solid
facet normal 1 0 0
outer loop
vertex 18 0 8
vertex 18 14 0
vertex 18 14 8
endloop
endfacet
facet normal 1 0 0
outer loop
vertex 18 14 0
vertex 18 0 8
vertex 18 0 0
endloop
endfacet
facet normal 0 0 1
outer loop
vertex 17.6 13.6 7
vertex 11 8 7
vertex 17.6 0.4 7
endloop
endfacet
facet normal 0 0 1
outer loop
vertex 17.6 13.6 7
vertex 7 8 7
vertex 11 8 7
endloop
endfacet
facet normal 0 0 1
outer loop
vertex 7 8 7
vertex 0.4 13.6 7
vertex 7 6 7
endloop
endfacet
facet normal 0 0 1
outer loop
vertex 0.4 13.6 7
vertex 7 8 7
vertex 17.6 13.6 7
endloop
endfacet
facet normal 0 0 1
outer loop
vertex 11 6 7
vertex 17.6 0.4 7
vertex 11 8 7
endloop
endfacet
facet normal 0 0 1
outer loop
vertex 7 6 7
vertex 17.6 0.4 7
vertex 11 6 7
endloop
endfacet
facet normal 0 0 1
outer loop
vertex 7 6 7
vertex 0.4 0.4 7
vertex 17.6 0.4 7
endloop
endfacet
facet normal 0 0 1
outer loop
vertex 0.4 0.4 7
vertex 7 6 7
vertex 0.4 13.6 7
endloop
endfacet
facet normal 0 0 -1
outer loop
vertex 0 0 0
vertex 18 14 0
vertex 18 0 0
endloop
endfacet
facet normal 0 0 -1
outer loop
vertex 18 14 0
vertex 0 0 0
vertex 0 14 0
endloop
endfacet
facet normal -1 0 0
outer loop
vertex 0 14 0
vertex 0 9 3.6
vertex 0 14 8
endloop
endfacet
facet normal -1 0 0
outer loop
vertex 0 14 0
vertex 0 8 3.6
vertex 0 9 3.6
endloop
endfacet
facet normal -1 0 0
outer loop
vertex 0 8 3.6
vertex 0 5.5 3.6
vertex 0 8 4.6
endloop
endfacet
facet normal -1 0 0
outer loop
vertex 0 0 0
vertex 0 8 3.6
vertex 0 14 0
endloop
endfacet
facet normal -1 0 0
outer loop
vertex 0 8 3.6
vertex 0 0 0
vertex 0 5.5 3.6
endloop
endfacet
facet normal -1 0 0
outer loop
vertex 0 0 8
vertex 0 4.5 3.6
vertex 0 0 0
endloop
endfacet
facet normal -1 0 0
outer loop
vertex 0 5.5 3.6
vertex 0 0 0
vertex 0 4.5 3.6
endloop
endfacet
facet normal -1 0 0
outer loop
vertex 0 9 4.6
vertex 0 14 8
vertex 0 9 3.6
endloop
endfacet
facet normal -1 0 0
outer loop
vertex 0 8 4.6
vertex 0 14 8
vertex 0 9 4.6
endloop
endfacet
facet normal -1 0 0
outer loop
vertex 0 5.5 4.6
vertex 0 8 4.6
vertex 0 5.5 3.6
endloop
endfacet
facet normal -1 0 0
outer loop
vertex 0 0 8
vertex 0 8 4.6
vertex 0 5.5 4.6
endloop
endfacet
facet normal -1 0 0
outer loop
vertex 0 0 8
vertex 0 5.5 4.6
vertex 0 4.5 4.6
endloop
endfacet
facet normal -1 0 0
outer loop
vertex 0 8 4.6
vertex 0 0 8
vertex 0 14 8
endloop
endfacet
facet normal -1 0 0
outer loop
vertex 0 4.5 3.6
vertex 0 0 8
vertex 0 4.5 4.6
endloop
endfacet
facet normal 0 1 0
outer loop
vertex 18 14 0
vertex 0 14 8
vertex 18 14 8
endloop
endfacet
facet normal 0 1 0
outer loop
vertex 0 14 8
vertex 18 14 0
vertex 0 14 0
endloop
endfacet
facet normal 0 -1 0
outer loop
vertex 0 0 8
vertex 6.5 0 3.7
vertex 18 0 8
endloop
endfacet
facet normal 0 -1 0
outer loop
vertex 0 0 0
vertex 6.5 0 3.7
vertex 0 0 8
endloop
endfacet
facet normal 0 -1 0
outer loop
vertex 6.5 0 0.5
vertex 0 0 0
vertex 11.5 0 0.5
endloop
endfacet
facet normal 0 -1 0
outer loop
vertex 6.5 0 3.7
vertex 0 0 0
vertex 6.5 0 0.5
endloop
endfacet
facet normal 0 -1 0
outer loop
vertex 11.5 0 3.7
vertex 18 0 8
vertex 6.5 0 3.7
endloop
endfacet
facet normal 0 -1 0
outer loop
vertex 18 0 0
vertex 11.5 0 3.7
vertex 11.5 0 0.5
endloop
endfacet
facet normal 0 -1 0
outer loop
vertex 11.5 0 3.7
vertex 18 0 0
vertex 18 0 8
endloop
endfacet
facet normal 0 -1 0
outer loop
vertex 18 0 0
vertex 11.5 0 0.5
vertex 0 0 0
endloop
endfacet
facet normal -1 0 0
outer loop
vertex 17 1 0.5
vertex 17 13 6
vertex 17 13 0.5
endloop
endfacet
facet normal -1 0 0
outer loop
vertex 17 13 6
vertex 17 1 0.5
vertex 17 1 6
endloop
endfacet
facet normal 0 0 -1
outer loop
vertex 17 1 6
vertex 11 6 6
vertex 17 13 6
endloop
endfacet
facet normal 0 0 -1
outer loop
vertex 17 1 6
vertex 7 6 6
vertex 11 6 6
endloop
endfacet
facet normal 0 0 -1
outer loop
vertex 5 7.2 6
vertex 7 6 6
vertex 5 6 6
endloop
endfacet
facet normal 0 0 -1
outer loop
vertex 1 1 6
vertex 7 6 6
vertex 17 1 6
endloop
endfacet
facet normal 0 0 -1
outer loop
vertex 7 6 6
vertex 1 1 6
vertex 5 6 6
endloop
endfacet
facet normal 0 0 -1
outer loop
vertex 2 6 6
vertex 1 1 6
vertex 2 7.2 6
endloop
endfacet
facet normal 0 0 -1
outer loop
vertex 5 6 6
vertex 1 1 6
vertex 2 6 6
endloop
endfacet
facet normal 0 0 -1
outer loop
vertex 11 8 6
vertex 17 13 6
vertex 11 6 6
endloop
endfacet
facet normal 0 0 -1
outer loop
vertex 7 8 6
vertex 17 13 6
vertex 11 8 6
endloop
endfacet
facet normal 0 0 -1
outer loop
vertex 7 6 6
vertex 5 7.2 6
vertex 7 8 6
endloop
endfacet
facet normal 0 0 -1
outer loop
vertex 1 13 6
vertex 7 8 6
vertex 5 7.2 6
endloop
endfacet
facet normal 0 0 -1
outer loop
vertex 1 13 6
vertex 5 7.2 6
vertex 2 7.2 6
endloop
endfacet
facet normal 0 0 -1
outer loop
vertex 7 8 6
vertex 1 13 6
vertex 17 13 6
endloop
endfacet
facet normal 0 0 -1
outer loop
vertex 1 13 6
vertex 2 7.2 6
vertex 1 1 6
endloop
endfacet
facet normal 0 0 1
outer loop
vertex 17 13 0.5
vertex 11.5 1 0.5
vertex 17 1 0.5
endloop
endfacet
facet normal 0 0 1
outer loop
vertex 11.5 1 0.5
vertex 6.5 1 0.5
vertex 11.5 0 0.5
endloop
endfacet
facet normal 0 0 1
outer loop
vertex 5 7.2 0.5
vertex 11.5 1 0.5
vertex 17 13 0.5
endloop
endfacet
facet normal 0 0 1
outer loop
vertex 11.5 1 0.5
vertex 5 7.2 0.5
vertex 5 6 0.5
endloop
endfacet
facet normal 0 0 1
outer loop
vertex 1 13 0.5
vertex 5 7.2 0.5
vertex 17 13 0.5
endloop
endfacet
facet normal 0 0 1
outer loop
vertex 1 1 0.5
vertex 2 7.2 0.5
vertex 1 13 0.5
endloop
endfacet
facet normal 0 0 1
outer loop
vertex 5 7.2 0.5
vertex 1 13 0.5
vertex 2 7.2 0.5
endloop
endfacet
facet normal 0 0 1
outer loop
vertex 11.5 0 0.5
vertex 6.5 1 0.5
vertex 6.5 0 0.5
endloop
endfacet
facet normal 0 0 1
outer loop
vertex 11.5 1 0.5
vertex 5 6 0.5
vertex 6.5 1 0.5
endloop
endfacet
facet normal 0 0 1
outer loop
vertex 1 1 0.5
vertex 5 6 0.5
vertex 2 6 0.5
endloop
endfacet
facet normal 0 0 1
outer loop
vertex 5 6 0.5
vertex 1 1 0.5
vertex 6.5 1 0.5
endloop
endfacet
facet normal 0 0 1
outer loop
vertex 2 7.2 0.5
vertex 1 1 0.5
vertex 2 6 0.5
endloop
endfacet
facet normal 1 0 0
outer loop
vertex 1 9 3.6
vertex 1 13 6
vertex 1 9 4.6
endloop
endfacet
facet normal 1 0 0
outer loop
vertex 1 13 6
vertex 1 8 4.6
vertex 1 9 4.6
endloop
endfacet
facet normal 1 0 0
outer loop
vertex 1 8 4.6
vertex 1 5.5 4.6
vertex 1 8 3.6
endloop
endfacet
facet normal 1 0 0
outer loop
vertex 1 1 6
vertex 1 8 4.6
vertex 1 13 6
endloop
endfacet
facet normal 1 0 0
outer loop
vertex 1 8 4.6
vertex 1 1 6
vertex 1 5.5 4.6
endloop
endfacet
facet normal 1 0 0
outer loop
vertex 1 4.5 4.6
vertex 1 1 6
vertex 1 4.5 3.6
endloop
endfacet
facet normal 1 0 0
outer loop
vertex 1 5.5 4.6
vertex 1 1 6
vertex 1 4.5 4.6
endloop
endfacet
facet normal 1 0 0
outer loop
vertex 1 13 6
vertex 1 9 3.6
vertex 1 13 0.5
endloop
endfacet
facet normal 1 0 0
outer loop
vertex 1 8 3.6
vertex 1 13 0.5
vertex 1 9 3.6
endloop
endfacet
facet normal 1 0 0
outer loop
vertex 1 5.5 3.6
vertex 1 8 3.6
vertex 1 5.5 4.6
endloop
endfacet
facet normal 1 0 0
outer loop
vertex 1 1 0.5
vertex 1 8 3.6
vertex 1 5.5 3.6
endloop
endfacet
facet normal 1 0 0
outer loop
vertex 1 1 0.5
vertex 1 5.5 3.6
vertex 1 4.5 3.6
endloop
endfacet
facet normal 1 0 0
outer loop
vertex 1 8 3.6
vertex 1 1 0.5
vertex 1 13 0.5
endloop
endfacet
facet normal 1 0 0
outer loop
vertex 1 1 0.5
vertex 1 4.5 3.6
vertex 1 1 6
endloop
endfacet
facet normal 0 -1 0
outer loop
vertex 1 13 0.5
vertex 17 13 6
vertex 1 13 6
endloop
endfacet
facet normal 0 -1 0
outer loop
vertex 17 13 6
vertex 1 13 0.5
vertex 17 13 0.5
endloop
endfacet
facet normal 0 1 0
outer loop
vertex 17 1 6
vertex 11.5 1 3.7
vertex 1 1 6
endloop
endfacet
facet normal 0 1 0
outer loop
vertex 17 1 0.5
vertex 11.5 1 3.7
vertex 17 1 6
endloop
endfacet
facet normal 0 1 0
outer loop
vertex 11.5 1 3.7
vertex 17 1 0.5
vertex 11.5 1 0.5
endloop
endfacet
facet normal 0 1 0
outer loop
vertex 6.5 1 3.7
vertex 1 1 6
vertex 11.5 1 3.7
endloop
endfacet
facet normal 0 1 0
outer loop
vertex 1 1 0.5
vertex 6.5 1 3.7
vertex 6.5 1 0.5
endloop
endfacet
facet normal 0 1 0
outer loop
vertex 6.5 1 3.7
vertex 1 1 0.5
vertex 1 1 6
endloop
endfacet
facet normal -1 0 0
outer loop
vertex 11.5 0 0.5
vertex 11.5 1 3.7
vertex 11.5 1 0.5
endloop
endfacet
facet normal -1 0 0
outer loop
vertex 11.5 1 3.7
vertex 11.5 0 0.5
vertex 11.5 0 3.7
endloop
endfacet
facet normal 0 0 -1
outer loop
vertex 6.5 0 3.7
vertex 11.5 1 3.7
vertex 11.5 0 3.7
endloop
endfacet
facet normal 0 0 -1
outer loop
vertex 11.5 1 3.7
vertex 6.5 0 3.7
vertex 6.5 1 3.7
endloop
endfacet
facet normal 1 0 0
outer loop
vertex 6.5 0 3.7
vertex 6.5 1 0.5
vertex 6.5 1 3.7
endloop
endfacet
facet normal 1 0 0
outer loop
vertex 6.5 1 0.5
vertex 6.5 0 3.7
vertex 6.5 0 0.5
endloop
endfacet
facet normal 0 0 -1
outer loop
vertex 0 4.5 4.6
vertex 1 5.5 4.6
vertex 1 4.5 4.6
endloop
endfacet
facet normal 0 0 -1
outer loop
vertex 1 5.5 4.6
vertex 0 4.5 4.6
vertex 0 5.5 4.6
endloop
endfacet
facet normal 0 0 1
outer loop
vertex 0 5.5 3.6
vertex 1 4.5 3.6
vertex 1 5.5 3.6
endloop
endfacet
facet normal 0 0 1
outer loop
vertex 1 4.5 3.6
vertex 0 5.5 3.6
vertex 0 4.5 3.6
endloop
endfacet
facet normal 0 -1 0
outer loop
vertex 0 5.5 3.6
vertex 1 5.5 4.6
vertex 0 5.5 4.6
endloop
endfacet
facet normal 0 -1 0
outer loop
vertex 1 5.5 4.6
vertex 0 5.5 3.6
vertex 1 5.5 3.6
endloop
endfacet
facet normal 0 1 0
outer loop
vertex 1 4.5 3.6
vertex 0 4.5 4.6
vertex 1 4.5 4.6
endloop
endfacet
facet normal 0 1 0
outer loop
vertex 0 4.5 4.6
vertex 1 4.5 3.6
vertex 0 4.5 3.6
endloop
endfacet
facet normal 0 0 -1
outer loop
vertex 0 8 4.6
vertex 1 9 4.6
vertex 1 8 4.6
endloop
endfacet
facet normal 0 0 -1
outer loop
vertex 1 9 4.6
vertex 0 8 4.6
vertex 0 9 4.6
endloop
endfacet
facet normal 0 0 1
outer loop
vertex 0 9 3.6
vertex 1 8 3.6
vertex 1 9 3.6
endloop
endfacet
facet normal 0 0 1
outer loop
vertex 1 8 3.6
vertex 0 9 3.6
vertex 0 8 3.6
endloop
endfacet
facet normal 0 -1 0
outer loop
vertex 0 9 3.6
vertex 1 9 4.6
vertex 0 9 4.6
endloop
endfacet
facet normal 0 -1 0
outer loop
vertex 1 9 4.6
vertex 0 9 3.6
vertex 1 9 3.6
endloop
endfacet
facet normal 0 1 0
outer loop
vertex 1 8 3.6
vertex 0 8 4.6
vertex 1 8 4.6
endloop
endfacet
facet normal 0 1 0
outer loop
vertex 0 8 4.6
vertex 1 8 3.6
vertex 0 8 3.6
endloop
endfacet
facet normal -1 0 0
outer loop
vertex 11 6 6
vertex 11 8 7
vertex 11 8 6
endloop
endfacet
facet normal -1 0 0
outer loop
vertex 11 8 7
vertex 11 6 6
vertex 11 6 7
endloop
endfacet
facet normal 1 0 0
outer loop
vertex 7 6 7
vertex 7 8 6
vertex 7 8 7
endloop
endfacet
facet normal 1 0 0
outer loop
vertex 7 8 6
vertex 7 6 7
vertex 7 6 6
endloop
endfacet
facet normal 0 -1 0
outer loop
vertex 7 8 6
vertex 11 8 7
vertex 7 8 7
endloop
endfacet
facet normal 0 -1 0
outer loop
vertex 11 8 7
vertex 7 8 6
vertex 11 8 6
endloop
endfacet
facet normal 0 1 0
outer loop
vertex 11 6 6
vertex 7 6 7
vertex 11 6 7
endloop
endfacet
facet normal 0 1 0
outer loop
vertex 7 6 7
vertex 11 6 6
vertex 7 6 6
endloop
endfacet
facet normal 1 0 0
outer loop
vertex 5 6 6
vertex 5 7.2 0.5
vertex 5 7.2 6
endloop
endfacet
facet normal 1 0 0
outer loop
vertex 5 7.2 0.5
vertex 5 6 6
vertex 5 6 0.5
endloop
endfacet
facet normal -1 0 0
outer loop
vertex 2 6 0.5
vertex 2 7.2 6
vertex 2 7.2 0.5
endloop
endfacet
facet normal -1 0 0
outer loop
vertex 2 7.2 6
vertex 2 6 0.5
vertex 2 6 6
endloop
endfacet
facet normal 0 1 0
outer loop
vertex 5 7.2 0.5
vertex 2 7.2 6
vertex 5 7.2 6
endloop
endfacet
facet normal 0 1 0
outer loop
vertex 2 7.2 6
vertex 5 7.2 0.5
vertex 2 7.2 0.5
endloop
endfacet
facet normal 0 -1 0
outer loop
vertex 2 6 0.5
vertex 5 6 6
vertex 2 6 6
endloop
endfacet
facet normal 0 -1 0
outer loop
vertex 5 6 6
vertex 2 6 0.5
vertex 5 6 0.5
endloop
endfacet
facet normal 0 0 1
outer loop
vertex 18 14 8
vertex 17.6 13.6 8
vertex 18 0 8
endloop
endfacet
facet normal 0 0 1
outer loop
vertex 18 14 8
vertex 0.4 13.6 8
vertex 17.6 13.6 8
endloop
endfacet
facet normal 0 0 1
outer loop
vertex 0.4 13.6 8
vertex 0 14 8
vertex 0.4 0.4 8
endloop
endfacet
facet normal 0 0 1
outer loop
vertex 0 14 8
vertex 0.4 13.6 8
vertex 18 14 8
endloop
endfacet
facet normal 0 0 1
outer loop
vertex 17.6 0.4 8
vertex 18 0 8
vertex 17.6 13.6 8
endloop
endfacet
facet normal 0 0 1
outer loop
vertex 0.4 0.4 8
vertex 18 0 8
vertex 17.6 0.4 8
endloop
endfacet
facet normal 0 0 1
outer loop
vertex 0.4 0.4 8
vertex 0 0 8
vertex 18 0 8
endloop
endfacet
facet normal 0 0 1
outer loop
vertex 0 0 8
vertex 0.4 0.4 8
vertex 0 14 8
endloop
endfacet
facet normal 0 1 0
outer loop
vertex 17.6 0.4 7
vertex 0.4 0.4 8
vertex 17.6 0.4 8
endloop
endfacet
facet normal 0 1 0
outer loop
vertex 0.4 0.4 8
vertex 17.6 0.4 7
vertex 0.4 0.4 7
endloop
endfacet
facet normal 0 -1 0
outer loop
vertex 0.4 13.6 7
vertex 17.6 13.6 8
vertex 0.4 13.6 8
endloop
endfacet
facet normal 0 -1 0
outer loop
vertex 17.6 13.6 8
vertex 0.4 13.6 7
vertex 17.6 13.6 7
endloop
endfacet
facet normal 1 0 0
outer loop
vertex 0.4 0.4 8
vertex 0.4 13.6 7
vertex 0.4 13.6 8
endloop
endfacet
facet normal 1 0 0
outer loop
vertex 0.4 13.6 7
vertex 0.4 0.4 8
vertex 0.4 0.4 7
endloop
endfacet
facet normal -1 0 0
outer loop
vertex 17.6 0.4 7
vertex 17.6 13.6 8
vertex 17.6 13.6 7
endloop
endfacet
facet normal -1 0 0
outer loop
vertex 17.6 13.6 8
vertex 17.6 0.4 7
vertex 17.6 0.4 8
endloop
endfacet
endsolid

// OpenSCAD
// 可进入地堡 - 入口 + 内部房间 + 内部直跑楼梯上顶台
// 轴: x=宽, y=深, z=高 (SCAD cube 无 center, 原点在角)
// 外尺寸 18(x) × 14(y) × 7(z); 墙厚 1; 内部完全中空可进入
// +X = 右, +Y = 前(门朝此), +Z = 上

module wall_shell() {
  difference() {
    cube([18, 14, 7]);
    // 挖内部空腔: 留 0.5 厚地台 + 1 厚顶
    translate([1, 1, 0.5]) cube([16, 12, 5.5]);
    // 正门洞 (y=0 面) w5 h3.2
    translate([6.5, -0.1, 0.5]) cube([5, 1.2, 3.2]);
    // 侧射击孔 (x=0 面) 两个
    translate([-0.1, 4.5, 3.6]) cube([1.2, 1, 1]);
    translate([-0.1, 8, 3.6]) cube([1.2, 1, 1]);
    // 顶台开口 (从内部上到顶)
    translate([7, 6, 6]) cube([4, 2, 1.2]);
  }
}

module stairs() {
  // 内部直跑楼梯: 从地台到顶 (12 级, 每级升 0.5)
  for (i = [0 : 1 : 11]) {
    translate([2, 6, 0.5 + i * 0.5]) cube([3, 1.2, 0.5]);
  }
}

module roof_rail() {
  // 顶台护栏
  translate([0, 0, 7]) {
    cube([18, 0.4, 1]);
    translate([0, 13.6, 0]) cube([18, 0.4, 1]);
    cube([0.4, 14, 1]);
    translate([17.6, 0, 0]) cube([0.4, 14, 1]);
  }
}

color("#8a8a82") wall_shell();
color("#6b6b63") stairs();
color("#55554f") roof_rail();
